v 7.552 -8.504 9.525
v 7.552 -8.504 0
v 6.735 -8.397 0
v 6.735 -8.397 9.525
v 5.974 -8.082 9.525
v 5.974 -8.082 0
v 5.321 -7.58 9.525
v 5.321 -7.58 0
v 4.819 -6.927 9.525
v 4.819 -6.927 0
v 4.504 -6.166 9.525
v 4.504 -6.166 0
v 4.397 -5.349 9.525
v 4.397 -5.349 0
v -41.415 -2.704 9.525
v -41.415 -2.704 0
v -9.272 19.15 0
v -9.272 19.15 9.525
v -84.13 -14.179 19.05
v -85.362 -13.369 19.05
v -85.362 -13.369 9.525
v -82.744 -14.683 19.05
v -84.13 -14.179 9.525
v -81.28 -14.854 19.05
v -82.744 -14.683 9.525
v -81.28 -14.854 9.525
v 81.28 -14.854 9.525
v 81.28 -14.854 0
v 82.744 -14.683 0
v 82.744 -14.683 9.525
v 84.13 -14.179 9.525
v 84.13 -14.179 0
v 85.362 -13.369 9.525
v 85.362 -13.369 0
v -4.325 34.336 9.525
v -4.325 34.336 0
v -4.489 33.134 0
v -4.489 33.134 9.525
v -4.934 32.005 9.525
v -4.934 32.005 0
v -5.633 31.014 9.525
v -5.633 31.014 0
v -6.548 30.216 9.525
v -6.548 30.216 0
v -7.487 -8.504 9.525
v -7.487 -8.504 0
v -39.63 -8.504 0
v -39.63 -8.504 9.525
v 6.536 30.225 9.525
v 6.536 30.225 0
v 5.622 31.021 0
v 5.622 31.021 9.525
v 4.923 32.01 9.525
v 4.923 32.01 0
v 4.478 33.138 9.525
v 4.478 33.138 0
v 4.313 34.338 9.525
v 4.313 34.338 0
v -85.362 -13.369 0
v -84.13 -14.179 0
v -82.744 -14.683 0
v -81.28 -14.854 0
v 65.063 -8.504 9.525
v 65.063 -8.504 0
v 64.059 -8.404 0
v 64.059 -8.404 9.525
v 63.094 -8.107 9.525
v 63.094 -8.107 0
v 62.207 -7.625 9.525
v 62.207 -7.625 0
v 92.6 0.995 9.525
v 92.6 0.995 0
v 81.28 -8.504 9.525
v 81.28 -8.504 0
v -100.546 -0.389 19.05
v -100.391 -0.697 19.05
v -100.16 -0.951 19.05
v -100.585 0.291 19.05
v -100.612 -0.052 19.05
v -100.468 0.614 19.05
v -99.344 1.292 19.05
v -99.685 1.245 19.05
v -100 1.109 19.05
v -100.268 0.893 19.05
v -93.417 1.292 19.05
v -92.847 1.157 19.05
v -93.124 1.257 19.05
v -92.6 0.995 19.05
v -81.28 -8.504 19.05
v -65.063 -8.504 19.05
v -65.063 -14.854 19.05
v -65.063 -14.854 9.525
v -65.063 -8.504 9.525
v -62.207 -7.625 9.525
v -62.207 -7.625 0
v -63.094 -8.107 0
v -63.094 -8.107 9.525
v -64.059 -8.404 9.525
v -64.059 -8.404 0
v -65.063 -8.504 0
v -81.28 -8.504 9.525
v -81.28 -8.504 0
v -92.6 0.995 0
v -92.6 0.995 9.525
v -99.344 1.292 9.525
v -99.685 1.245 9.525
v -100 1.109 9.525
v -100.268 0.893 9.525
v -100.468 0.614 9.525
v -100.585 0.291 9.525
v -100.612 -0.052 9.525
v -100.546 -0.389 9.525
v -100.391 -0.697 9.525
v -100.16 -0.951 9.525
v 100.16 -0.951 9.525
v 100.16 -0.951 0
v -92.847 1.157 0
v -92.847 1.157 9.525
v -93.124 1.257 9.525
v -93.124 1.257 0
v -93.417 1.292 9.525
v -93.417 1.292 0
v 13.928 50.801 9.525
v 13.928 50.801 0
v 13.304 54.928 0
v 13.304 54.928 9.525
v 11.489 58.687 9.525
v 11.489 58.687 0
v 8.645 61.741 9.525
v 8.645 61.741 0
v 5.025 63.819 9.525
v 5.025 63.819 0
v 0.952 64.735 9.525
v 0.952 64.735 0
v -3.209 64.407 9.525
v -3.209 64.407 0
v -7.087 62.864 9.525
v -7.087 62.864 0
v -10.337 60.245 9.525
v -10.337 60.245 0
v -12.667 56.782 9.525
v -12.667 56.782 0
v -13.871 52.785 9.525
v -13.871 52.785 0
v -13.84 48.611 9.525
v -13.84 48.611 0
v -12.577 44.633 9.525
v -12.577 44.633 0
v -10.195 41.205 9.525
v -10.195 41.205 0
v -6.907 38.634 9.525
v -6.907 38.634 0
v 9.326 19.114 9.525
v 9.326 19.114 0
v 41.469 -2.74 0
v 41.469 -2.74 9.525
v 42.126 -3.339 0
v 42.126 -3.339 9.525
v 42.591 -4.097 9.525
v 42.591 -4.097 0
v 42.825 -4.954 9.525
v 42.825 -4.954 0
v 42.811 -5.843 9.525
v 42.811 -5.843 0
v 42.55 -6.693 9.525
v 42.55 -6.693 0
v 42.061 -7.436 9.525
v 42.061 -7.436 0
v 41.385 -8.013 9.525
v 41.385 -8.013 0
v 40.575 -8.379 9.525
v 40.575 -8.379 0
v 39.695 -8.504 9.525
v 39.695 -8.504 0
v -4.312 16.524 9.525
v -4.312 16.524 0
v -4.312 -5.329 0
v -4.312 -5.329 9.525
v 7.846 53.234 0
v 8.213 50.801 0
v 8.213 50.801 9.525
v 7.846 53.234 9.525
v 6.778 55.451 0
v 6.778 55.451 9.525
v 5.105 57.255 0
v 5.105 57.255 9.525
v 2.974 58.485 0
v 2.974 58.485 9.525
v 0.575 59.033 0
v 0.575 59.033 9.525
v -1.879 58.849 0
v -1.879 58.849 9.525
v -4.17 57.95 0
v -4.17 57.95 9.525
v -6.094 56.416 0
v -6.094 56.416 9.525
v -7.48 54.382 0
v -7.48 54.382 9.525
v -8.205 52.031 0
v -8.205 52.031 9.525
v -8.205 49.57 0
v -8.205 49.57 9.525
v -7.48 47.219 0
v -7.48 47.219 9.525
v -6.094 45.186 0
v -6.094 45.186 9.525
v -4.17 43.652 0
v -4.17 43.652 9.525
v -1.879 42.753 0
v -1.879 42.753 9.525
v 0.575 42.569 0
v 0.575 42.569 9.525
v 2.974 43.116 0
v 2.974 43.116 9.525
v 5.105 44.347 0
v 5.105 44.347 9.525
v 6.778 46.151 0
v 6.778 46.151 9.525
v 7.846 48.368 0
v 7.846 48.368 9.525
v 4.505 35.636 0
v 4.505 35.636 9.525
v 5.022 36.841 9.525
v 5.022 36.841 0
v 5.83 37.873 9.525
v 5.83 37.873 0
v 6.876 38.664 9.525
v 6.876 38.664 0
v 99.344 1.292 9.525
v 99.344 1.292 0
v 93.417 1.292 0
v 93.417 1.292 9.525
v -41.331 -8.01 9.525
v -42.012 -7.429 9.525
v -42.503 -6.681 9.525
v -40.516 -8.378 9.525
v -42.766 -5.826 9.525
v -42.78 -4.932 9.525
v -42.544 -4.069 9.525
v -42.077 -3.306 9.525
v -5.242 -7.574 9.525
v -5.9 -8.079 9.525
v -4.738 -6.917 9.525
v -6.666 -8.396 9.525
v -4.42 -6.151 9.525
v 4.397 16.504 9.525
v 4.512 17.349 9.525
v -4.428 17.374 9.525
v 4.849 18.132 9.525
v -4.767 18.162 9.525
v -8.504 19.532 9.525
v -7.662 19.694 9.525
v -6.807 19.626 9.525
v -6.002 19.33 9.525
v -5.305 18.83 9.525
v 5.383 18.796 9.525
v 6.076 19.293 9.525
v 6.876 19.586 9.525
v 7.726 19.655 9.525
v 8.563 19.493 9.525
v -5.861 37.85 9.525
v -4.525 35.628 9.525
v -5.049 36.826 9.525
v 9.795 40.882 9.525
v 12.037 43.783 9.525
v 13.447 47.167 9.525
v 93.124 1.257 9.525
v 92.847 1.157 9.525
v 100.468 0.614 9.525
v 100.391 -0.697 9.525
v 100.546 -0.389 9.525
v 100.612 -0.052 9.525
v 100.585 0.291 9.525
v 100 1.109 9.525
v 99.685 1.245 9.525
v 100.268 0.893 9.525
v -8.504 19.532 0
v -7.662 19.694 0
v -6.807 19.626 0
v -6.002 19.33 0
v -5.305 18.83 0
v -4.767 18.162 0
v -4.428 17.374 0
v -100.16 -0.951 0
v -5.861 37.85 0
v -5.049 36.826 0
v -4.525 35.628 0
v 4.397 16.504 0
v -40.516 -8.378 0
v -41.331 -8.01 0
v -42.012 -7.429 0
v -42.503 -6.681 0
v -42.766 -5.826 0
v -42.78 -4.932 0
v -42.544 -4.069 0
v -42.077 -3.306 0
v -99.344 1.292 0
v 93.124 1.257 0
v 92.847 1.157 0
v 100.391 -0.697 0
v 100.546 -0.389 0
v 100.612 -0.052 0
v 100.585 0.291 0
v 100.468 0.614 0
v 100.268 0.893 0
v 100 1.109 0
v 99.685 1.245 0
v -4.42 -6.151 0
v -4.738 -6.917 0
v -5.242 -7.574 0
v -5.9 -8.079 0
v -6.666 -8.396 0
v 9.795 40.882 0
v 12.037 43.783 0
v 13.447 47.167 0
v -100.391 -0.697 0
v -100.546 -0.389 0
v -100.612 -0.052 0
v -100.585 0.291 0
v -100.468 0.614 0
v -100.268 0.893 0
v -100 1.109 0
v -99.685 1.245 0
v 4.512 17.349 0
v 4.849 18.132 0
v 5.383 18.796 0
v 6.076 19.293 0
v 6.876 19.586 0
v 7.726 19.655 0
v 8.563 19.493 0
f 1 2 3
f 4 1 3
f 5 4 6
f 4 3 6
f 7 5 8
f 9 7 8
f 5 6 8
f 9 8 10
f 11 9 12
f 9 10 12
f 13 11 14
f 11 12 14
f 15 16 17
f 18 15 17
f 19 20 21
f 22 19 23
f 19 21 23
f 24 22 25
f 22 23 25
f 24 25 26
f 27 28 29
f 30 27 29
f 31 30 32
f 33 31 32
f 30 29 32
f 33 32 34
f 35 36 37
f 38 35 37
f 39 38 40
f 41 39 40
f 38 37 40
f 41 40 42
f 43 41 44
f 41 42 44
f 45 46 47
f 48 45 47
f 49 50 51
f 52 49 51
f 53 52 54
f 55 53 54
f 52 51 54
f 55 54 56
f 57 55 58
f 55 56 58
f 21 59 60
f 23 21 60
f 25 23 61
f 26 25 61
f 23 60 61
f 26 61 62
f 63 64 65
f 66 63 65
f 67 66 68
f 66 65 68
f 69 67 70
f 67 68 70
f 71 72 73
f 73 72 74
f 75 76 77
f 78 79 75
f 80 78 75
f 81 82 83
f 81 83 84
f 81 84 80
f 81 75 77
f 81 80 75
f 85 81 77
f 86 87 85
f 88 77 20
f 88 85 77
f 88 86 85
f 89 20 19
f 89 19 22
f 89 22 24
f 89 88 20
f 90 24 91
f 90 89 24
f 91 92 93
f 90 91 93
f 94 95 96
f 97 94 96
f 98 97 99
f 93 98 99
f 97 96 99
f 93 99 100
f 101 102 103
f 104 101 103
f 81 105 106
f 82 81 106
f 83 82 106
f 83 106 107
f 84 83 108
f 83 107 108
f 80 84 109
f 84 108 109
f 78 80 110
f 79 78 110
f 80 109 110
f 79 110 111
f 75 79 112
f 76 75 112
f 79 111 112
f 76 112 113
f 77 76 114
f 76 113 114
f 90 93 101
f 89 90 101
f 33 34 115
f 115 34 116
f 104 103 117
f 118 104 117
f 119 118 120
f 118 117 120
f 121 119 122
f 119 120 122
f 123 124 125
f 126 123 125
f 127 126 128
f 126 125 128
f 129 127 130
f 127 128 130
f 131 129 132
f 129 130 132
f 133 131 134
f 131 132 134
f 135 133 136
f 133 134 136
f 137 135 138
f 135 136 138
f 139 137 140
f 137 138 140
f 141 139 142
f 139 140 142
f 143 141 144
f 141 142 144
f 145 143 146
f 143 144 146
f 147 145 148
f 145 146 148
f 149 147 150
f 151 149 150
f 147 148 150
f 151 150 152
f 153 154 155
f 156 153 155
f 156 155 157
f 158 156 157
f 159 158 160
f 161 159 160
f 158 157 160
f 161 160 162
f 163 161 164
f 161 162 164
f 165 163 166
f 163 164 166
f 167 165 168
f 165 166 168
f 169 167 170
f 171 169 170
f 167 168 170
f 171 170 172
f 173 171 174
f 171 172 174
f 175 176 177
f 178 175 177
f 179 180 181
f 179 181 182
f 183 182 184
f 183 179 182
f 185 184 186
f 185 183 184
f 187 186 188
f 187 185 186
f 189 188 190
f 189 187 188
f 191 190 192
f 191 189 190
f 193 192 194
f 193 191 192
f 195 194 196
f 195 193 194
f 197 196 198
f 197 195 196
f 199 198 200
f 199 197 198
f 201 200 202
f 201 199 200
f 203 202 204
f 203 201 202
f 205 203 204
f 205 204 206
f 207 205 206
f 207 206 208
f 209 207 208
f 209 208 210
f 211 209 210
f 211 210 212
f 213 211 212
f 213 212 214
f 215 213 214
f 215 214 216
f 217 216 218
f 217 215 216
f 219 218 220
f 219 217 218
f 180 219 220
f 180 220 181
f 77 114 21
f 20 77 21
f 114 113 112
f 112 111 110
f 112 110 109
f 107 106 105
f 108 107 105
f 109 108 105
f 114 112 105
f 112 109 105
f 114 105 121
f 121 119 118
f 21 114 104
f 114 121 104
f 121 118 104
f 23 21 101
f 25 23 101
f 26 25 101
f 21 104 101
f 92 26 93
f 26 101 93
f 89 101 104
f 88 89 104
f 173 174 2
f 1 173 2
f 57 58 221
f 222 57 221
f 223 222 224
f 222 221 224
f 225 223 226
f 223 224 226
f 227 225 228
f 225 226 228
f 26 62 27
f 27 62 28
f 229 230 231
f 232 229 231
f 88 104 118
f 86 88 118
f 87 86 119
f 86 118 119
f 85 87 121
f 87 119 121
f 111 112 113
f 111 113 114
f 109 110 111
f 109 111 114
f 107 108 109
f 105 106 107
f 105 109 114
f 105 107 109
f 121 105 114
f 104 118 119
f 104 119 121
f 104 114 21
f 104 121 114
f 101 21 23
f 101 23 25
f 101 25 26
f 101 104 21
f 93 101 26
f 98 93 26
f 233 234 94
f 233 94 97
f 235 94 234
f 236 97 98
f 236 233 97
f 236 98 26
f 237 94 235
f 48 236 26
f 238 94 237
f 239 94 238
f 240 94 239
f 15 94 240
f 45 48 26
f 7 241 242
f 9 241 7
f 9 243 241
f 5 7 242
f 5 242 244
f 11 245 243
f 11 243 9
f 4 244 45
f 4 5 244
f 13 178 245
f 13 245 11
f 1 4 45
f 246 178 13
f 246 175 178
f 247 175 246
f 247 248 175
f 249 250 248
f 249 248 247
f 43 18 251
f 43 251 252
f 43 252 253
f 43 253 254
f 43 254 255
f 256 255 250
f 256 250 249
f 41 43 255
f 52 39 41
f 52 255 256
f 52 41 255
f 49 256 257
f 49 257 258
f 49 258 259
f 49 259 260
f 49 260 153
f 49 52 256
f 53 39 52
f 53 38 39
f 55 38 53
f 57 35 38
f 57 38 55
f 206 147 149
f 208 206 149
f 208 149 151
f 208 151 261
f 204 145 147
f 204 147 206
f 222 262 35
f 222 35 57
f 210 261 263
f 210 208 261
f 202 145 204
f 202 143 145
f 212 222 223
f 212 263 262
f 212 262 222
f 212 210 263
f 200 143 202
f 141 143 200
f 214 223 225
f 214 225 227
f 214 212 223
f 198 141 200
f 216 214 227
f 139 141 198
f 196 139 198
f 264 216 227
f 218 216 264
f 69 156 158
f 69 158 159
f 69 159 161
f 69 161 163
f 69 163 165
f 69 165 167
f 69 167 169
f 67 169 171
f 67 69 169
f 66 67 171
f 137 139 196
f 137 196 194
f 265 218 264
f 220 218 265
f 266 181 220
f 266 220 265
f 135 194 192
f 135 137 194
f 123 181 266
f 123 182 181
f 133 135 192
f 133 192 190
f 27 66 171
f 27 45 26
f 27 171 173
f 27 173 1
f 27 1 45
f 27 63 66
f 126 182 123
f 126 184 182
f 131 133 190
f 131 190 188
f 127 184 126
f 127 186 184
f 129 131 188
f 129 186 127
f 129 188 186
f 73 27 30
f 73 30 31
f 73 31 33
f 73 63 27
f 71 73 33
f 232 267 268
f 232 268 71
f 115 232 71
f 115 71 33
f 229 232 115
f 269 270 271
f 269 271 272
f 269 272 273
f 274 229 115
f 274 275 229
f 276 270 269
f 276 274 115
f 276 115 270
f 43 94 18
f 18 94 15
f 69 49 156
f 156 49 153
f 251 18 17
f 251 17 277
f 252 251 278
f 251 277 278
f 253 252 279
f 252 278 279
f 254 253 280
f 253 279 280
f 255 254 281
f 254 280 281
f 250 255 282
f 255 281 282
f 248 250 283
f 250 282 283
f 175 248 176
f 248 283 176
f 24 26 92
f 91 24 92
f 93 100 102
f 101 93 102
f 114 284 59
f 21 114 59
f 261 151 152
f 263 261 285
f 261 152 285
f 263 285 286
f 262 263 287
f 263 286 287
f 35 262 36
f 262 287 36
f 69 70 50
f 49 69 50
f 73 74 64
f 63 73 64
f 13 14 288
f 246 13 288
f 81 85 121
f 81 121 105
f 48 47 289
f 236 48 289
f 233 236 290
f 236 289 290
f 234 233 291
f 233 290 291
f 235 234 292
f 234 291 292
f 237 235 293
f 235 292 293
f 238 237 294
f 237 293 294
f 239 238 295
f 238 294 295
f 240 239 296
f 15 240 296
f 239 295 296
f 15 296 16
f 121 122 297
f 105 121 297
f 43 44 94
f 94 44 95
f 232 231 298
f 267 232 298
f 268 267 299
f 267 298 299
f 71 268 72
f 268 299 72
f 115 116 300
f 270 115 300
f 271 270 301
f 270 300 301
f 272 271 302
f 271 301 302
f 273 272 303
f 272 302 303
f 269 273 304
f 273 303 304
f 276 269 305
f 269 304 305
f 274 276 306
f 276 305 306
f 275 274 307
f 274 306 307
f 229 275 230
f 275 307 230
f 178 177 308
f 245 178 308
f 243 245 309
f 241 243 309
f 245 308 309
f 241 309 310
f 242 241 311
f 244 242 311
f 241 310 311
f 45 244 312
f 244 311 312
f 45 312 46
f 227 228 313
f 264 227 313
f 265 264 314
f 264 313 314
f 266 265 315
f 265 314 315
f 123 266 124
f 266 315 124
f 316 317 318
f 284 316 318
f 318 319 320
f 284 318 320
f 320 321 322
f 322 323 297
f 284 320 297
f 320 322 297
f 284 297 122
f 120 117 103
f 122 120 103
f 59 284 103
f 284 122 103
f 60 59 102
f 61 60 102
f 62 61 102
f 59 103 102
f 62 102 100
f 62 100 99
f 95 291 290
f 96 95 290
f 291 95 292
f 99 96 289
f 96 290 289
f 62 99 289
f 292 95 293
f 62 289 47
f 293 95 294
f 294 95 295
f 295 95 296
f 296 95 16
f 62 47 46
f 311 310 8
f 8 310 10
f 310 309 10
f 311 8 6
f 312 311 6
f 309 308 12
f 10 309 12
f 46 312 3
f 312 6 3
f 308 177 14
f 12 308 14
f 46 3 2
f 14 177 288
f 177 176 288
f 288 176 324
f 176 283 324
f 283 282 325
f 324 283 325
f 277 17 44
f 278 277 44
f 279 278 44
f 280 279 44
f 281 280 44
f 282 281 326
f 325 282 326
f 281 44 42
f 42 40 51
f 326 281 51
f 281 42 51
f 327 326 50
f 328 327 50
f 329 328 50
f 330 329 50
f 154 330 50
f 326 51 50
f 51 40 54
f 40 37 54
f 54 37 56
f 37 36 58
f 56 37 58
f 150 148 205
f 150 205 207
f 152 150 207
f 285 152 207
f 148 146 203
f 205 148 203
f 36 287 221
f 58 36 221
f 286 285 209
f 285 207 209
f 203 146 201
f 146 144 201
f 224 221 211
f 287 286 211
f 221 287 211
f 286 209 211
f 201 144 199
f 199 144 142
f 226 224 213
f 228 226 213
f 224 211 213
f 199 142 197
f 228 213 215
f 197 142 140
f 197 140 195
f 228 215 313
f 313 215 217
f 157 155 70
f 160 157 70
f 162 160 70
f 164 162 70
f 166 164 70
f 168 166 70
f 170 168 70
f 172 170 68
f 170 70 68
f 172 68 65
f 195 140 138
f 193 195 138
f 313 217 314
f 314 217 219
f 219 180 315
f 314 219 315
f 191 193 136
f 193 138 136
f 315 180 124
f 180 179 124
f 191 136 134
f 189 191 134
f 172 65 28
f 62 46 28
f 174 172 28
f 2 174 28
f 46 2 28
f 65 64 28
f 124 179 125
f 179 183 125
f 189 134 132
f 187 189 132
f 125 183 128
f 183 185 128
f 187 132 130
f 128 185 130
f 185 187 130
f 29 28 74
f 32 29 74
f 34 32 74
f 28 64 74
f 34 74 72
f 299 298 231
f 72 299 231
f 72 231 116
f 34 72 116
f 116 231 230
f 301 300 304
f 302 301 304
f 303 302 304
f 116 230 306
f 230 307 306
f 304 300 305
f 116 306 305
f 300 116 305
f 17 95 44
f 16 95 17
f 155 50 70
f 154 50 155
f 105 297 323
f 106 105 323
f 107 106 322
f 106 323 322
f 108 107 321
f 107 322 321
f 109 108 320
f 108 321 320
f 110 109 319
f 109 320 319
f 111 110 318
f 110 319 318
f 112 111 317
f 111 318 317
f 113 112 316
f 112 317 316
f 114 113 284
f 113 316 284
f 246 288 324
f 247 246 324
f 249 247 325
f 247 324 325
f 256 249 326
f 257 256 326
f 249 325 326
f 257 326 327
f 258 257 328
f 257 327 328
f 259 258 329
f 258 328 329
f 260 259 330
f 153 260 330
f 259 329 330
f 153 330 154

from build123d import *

# Parameters (mm, degrees)
F0_R        = 8.255
F1_DEPTH    = 9.525
F2_T1_DEPTH = 9.525
F4_DEPTH    = 9.525


# Not quite as in the source:
# - a fillet or chamfer that OpenCascade refuses, or shapes differently, is made with other operations: its cross-section is extruded or revolved along the edge and cut away or added
# - ends of sketch curves that miss each other by under 0.0002 mm in the source are joined
# - a feature names something its author has since deleted; it is built from what else it names


with BuildPart() as f1:
    # F0 (on Top) → F1 (new body)
    with BuildSketch(Plane.XY):
        with BuildLine():
            ThreePointArc((4.3122524784, 37.526747704), (-0.0112650872, 36.8307900709), (-4.3378264209, 37.5075678728))
            Line((-4.3378264209, 37.5075678728), (-4.3122524784, 31.736497147))
            Line((-4.3122524784, 31.736497147), (-63.5, -8.504387986))
            Line((-63.5, -8.504387986), (-81.28, -8.5043879861))
            Line((-81.28, -8.5043879861), (-92.6004192464, 0.9945716283))
            ThreePointArc((-92.6004192464, 0.9945716283), (-92.9823939286, 1.215104814), (-93.4167595107, 1.2916951856))
            Line((-93.4167595107, 1.2916951856), (-99.344067291, 1.2916951856))
            ThreePointArc((-99.344067291, 1.2916951856), (-100.5374769194, 0.4560607676), (-100.1604075553, -0.9511812572))
            Line((-100.1604075553, -0.9511812572), (-85.3617007511, -13.3687706785))
            ThreePointArc((-85.3617007511, -13.3687706785), (-83.4518273397, -14.4714366067), (-81.2799994295, -14.8543884647))
            Line((-81.2799994295, -14.8543884647), (55.6916793662, -14.8543884647))
            Line((55.6916793662, -14.8543884647), (81.2799994295, -14.8543884647))
            ThreePointArc((81.2799994295, -14.8543884647), (83.4518273397, -14.4714366067), (85.3617007511, -13.3687706785))
            Line((85.3617007511, -13.3687706785), (100.1604075553, -0.9511812572))
            ThreePointArc((100.1604075553, -0.9511812572), (100.5374769194, 0.4560607676), (99.344067291, 1.2916951856))
            Line((99.344067291, 1.2916951856), (93.4167595107, 1.2916951856))
            ThreePointArc((93.4167595107, 1.2916951856), (92.9823939286, 1.215104814), (92.6004192464, 0.9945716283))
            Line((92.6004192464, 0.9945716283), (81.2799994295, -8.5043884647))
            Line((81.2799994295, -8.5043884647), (63.5, -8.504387986))
            Line((63.5, -8.504387986), (4.3122524784, 31.736497147))
            Line((4.3122524784, 31.736497147), (4.3122524784, 37.526747704))
        make_face()
        with BuildLine():
            ThreePointArc((-9.272381027, 19.1498236636), (-6.0018498632, 19.3302933306), (-4.3122524784, 16.5241921081))
            Line((-4.3122524784, 16.5241921081), (-4.3122524784, -5.329387986))
            ThreePointArc((-4.3122524784, -5.329387986), (-5.2421884481, -7.5744520163), (-7.4872524784, -8.504387986))
            Line((-7.4872524784, -8.504387986), (-39.630287523, -8.504387986))
            ThreePointArc((-39.630287523, -8.504387986), (-42.6648389881, -6.2632629272), (-41.4154160715, -2.7037564306))
            Line((-41.4154160715, -2.7037564306), (-9.272381027, 19.1498236636))
        make_face(mode=Mode.SUBTRACT)
        with BuildLine():
            Line((4.3967338988, -5.3492686827), (4.3967338988, 16.5043114114))
            ThreePointArc((4.3967338988, 16.5043114114), (6.0757516386, 19.2928418474), (9.3258039242, 19.1135022159))
            Line((9.3258039242, 19.1135022159), (41.4688389688, -2.7400778782))
            ThreePointArc((41.4688389688, -2.7400778782), (42.7104384529, -6.2772960382), (39.6948882467, -8.504387986))
            Line((39.6948882467, -8.504387986), (7.5518532022, -8.504387986))
            ThreePointArc((7.5518532022, -8.504387986), (5.3208469473, -7.5802749375), (4.3967338988, -5.3492686827))
        make_face(mode=Mode.SUBTRACT)
        with BuildLine():
            ThreePointArc((4.3122524784, 37.526747704), (11.2713168612, 42.6053719635), (13.9277592898, 50.8007557298))
            ThreePointArc((13.9277592898, 50.8007557298), (-8.2626898349, 62.0961138999), (-4.3378264209, 37.5075678728))
            ThreePointArc((-4.3378264209, 37.5075678728), (-0.0112650872, 36.8307900709), (4.3122524784, 37.526747704))
        make_face()
        with Locations((-0.0422407102, 50.8007557298)):
            Circle(F0_R, mode=Mode.SUBTRACT)
    extrude(amount=F1_DEPTH)

    # F2: fillet of radius 5.08 on 6 edges, made by hand

    # F2_s2 → F2_t1 (join)
    with BuildSketch(Plane.XY):
        with BuildLine():
            ThreePointArc((6.5360468007, 30.2245718646), (4.9024905224, 32.0489381691), (4.3122524784, 34.4255823534))
            Line((4.3122524784, 34.4255823534), (4.3122524784, 31.736497147))
            Line((4.3122524784, 31.736497147), (6.5360468007, 30.2245718646))
        make_face()
        with BuildLine():
            ThreePointArc((4.3122524784, 34.2510476275), (4.9998161704, 36.8030866711), (6.8763876281, 38.6643031214))
            ThreePointArc((6.8763876281, 38.6643031214), (5.6229446638, 38.0310033956), (4.3122524784, 37.526747704))
            Line((4.3122524784, 37.526747704), (4.3122524784, 34.2510476275))
        make_face()
        with BuildLine():
            ThreePointArc((-4.3242327121, 34.4399823871), (-4.909166003, 32.0507806283), (-6.5479771563, 30.2164605901))
            Line((-6.5479771563, 30.2164605901), (-4.3122524784, 31.736497147))
            Line((-4.3122524784, 31.736497147), (-4.3242327121, 34.4399823871))
        make_face()
        with BuildLine():
            ThreePointArc((-6.9069886961, 38.6337456168), (-5.0221798353, 36.7808624145), (-4.3233105691, 34.2318896113))
            Line((-4.3233105691, 34.2318896113), (-4.3378264209, 37.5075678728))
            ThreePointArc((-4.3378264209, 37.5075678728), (-5.6507459596, 38.0060080235), (-6.9069886961, 38.6337456168))
        make_face()
        with BuildLine():
            ThreePointArc((65.063356077, -8.5043880281), (63.5691562425, -8.2796703522), (62.207150536, -7.6253985169))
            Line((62.207150536, -7.6253985169), (63.5, -8.504387986))
            Line((63.5, -8.504387986), (65.063356077, -8.5043880281))
        make_face()
        with BuildLine():
            ThreePointArc((-62.2071504741, -7.6253984748), (-63.569156246, -8.2796703302), (-65.0633561518, -8.504387986))
            Line((-65.0633561518, -8.504387986), (-63.5, -8.504387986))
            Line((-63.5, -8.504387986), (-62.2071504741, -7.6253984748))
        make_face()
    extrude(amount=F2_T1_DEPTH)


with BuildPart() as f4:
    # F3 (on face) → F4 (new body)
    with BuildSketch(Plane.XY.offset(9.525)):
        with BuildLine():
            ThreePointArc((-92.6004192464, 0.9945716283), (-92.9823939286, 1.215104814), (-93.4167595107, 1.2916951856))
            Line((-93.4167595107, 1.2916951856), (-99.344067291, 1.2916951856))
            ThreePointArc((-99.344067291, 1.2916951856), (-100.5374769194, 0.4560607676), (-100.1604075553, -0.9511812572))
            Line((-100.1604075553, -0.9511812572), (-85.3617007511, -13.3687706785))
            ThreePointArc((-85.3617007511, -13.3687706785), (-83.451827419, -14.4714365778), (-81.2799995983, -14.8543884647))
            Line((-81.2799995983, -14.8543884647), (-65.0633561518, -14.8543884647))
            Line((-65.0633561518, -14.8543884647), (-65.0633561518, -8.504387986))
            Line((-65.0633561518, -8.504387986), (-81.28, -8.5043879861))
            Line((-81.28, -8.5043879861), (-92.6004192464, 0.9945716283))
        make_face()
    extrude(amount=F4_DEPTH)


solid = Compound([f1.part, f4.part])
